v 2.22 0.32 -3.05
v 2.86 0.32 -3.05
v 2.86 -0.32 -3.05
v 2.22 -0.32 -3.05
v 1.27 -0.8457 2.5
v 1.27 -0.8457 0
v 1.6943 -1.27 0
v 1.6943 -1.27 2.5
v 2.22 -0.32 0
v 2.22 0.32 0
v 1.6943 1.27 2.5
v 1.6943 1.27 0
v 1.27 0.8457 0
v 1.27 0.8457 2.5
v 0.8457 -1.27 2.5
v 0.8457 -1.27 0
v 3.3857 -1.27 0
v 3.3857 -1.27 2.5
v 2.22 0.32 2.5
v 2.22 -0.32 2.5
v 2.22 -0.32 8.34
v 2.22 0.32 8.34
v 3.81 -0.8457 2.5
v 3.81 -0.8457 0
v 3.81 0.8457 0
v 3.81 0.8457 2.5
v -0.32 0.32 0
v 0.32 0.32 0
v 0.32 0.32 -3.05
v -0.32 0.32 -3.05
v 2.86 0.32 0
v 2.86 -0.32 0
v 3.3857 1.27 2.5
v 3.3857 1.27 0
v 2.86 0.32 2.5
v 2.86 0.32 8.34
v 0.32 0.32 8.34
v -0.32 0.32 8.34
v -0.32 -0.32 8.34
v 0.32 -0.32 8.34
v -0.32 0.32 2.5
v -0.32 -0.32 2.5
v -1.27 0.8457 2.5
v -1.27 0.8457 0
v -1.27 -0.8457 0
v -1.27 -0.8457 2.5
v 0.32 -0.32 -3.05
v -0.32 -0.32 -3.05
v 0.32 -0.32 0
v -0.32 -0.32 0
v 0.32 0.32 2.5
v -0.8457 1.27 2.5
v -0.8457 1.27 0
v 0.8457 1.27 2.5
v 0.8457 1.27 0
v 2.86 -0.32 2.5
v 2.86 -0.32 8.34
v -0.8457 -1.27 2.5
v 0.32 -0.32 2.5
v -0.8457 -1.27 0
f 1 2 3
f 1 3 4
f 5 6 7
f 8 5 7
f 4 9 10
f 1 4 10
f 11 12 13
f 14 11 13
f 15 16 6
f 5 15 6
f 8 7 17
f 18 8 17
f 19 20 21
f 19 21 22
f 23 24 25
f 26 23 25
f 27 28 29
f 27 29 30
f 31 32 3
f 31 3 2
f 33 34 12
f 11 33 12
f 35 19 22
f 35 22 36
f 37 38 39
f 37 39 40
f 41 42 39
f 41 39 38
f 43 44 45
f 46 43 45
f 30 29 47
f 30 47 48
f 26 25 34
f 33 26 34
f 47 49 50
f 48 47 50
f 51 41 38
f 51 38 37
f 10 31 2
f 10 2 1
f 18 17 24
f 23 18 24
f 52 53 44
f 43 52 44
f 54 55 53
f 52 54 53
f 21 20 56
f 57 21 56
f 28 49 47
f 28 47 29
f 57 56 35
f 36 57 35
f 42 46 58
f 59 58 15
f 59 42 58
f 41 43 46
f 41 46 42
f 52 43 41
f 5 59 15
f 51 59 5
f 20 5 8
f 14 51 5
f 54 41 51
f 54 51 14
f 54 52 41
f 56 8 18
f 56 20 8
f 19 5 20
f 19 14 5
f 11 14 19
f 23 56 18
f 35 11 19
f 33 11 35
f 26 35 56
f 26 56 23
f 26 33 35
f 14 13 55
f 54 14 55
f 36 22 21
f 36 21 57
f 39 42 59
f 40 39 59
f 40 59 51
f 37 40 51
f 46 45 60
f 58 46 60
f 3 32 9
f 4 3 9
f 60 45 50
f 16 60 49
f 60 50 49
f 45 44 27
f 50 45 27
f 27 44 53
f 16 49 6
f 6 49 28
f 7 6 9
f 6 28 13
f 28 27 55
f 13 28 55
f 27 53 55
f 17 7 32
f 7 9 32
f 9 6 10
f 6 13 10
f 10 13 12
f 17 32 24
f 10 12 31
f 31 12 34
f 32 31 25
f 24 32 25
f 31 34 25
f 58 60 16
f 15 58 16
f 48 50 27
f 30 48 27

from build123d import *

# Parameters (mm, degrees)
PEG_DEPTH      = 2.5
TAIL_BASE_W    = 0.64
TAIL_BASE_H    = 0.64
TAIL_DEPTH     = 3.05
HEAD_BASE_W    = 0.64
HEAD_BASE_H    = 0.64
HEAD_DEPTH     = 5.84
MULTIPLY_COUNT = 2
MULTIPLY_PITCH = 2.54


with BuildPart() as part:
    # peg base → peg (new body)
    with BuildSketch(Plane.XY):
        Polygon((0.845735931, -1.27), (1.27, -0.845735931), (1.27, 0.845735931), (0.845735931, 1.27), (-0.845735931, 1.27), (-1.27, 0.845735931), (-1.27, -0.845735931), (-0.845735931, -1.27), align=None)
    peg = extrude(amount=PEG_DEPTH)

    # tail base → tail (add)
    with BuildSketch(Plane(origin=(0, 0, 0), x_dir=(-1, 0, 0), z_dir=(0, 0, -1))):
        Rectangle(TAIL_BASE_W, TAIL_BASE_H)
    tail = extrude(amount=TAIL_DEPTH)

    # head base → head (add)
    with BuildSketch(Plane.XY.offset(2.5)):
        Rectangle(HEAD_BASE_W, HEAD_BASE_H)
    head = extrude(amount=HEAD_DEPTH)

    # multiply: peg, tail, head ×2
    with Locations(*[(i * MULTIPLY_PITCH, 0, 0) for i in range(1, MULTIPLY_COUNT)]):
        add(peg)
        add(tail)
        add(head)


solid = part.part
